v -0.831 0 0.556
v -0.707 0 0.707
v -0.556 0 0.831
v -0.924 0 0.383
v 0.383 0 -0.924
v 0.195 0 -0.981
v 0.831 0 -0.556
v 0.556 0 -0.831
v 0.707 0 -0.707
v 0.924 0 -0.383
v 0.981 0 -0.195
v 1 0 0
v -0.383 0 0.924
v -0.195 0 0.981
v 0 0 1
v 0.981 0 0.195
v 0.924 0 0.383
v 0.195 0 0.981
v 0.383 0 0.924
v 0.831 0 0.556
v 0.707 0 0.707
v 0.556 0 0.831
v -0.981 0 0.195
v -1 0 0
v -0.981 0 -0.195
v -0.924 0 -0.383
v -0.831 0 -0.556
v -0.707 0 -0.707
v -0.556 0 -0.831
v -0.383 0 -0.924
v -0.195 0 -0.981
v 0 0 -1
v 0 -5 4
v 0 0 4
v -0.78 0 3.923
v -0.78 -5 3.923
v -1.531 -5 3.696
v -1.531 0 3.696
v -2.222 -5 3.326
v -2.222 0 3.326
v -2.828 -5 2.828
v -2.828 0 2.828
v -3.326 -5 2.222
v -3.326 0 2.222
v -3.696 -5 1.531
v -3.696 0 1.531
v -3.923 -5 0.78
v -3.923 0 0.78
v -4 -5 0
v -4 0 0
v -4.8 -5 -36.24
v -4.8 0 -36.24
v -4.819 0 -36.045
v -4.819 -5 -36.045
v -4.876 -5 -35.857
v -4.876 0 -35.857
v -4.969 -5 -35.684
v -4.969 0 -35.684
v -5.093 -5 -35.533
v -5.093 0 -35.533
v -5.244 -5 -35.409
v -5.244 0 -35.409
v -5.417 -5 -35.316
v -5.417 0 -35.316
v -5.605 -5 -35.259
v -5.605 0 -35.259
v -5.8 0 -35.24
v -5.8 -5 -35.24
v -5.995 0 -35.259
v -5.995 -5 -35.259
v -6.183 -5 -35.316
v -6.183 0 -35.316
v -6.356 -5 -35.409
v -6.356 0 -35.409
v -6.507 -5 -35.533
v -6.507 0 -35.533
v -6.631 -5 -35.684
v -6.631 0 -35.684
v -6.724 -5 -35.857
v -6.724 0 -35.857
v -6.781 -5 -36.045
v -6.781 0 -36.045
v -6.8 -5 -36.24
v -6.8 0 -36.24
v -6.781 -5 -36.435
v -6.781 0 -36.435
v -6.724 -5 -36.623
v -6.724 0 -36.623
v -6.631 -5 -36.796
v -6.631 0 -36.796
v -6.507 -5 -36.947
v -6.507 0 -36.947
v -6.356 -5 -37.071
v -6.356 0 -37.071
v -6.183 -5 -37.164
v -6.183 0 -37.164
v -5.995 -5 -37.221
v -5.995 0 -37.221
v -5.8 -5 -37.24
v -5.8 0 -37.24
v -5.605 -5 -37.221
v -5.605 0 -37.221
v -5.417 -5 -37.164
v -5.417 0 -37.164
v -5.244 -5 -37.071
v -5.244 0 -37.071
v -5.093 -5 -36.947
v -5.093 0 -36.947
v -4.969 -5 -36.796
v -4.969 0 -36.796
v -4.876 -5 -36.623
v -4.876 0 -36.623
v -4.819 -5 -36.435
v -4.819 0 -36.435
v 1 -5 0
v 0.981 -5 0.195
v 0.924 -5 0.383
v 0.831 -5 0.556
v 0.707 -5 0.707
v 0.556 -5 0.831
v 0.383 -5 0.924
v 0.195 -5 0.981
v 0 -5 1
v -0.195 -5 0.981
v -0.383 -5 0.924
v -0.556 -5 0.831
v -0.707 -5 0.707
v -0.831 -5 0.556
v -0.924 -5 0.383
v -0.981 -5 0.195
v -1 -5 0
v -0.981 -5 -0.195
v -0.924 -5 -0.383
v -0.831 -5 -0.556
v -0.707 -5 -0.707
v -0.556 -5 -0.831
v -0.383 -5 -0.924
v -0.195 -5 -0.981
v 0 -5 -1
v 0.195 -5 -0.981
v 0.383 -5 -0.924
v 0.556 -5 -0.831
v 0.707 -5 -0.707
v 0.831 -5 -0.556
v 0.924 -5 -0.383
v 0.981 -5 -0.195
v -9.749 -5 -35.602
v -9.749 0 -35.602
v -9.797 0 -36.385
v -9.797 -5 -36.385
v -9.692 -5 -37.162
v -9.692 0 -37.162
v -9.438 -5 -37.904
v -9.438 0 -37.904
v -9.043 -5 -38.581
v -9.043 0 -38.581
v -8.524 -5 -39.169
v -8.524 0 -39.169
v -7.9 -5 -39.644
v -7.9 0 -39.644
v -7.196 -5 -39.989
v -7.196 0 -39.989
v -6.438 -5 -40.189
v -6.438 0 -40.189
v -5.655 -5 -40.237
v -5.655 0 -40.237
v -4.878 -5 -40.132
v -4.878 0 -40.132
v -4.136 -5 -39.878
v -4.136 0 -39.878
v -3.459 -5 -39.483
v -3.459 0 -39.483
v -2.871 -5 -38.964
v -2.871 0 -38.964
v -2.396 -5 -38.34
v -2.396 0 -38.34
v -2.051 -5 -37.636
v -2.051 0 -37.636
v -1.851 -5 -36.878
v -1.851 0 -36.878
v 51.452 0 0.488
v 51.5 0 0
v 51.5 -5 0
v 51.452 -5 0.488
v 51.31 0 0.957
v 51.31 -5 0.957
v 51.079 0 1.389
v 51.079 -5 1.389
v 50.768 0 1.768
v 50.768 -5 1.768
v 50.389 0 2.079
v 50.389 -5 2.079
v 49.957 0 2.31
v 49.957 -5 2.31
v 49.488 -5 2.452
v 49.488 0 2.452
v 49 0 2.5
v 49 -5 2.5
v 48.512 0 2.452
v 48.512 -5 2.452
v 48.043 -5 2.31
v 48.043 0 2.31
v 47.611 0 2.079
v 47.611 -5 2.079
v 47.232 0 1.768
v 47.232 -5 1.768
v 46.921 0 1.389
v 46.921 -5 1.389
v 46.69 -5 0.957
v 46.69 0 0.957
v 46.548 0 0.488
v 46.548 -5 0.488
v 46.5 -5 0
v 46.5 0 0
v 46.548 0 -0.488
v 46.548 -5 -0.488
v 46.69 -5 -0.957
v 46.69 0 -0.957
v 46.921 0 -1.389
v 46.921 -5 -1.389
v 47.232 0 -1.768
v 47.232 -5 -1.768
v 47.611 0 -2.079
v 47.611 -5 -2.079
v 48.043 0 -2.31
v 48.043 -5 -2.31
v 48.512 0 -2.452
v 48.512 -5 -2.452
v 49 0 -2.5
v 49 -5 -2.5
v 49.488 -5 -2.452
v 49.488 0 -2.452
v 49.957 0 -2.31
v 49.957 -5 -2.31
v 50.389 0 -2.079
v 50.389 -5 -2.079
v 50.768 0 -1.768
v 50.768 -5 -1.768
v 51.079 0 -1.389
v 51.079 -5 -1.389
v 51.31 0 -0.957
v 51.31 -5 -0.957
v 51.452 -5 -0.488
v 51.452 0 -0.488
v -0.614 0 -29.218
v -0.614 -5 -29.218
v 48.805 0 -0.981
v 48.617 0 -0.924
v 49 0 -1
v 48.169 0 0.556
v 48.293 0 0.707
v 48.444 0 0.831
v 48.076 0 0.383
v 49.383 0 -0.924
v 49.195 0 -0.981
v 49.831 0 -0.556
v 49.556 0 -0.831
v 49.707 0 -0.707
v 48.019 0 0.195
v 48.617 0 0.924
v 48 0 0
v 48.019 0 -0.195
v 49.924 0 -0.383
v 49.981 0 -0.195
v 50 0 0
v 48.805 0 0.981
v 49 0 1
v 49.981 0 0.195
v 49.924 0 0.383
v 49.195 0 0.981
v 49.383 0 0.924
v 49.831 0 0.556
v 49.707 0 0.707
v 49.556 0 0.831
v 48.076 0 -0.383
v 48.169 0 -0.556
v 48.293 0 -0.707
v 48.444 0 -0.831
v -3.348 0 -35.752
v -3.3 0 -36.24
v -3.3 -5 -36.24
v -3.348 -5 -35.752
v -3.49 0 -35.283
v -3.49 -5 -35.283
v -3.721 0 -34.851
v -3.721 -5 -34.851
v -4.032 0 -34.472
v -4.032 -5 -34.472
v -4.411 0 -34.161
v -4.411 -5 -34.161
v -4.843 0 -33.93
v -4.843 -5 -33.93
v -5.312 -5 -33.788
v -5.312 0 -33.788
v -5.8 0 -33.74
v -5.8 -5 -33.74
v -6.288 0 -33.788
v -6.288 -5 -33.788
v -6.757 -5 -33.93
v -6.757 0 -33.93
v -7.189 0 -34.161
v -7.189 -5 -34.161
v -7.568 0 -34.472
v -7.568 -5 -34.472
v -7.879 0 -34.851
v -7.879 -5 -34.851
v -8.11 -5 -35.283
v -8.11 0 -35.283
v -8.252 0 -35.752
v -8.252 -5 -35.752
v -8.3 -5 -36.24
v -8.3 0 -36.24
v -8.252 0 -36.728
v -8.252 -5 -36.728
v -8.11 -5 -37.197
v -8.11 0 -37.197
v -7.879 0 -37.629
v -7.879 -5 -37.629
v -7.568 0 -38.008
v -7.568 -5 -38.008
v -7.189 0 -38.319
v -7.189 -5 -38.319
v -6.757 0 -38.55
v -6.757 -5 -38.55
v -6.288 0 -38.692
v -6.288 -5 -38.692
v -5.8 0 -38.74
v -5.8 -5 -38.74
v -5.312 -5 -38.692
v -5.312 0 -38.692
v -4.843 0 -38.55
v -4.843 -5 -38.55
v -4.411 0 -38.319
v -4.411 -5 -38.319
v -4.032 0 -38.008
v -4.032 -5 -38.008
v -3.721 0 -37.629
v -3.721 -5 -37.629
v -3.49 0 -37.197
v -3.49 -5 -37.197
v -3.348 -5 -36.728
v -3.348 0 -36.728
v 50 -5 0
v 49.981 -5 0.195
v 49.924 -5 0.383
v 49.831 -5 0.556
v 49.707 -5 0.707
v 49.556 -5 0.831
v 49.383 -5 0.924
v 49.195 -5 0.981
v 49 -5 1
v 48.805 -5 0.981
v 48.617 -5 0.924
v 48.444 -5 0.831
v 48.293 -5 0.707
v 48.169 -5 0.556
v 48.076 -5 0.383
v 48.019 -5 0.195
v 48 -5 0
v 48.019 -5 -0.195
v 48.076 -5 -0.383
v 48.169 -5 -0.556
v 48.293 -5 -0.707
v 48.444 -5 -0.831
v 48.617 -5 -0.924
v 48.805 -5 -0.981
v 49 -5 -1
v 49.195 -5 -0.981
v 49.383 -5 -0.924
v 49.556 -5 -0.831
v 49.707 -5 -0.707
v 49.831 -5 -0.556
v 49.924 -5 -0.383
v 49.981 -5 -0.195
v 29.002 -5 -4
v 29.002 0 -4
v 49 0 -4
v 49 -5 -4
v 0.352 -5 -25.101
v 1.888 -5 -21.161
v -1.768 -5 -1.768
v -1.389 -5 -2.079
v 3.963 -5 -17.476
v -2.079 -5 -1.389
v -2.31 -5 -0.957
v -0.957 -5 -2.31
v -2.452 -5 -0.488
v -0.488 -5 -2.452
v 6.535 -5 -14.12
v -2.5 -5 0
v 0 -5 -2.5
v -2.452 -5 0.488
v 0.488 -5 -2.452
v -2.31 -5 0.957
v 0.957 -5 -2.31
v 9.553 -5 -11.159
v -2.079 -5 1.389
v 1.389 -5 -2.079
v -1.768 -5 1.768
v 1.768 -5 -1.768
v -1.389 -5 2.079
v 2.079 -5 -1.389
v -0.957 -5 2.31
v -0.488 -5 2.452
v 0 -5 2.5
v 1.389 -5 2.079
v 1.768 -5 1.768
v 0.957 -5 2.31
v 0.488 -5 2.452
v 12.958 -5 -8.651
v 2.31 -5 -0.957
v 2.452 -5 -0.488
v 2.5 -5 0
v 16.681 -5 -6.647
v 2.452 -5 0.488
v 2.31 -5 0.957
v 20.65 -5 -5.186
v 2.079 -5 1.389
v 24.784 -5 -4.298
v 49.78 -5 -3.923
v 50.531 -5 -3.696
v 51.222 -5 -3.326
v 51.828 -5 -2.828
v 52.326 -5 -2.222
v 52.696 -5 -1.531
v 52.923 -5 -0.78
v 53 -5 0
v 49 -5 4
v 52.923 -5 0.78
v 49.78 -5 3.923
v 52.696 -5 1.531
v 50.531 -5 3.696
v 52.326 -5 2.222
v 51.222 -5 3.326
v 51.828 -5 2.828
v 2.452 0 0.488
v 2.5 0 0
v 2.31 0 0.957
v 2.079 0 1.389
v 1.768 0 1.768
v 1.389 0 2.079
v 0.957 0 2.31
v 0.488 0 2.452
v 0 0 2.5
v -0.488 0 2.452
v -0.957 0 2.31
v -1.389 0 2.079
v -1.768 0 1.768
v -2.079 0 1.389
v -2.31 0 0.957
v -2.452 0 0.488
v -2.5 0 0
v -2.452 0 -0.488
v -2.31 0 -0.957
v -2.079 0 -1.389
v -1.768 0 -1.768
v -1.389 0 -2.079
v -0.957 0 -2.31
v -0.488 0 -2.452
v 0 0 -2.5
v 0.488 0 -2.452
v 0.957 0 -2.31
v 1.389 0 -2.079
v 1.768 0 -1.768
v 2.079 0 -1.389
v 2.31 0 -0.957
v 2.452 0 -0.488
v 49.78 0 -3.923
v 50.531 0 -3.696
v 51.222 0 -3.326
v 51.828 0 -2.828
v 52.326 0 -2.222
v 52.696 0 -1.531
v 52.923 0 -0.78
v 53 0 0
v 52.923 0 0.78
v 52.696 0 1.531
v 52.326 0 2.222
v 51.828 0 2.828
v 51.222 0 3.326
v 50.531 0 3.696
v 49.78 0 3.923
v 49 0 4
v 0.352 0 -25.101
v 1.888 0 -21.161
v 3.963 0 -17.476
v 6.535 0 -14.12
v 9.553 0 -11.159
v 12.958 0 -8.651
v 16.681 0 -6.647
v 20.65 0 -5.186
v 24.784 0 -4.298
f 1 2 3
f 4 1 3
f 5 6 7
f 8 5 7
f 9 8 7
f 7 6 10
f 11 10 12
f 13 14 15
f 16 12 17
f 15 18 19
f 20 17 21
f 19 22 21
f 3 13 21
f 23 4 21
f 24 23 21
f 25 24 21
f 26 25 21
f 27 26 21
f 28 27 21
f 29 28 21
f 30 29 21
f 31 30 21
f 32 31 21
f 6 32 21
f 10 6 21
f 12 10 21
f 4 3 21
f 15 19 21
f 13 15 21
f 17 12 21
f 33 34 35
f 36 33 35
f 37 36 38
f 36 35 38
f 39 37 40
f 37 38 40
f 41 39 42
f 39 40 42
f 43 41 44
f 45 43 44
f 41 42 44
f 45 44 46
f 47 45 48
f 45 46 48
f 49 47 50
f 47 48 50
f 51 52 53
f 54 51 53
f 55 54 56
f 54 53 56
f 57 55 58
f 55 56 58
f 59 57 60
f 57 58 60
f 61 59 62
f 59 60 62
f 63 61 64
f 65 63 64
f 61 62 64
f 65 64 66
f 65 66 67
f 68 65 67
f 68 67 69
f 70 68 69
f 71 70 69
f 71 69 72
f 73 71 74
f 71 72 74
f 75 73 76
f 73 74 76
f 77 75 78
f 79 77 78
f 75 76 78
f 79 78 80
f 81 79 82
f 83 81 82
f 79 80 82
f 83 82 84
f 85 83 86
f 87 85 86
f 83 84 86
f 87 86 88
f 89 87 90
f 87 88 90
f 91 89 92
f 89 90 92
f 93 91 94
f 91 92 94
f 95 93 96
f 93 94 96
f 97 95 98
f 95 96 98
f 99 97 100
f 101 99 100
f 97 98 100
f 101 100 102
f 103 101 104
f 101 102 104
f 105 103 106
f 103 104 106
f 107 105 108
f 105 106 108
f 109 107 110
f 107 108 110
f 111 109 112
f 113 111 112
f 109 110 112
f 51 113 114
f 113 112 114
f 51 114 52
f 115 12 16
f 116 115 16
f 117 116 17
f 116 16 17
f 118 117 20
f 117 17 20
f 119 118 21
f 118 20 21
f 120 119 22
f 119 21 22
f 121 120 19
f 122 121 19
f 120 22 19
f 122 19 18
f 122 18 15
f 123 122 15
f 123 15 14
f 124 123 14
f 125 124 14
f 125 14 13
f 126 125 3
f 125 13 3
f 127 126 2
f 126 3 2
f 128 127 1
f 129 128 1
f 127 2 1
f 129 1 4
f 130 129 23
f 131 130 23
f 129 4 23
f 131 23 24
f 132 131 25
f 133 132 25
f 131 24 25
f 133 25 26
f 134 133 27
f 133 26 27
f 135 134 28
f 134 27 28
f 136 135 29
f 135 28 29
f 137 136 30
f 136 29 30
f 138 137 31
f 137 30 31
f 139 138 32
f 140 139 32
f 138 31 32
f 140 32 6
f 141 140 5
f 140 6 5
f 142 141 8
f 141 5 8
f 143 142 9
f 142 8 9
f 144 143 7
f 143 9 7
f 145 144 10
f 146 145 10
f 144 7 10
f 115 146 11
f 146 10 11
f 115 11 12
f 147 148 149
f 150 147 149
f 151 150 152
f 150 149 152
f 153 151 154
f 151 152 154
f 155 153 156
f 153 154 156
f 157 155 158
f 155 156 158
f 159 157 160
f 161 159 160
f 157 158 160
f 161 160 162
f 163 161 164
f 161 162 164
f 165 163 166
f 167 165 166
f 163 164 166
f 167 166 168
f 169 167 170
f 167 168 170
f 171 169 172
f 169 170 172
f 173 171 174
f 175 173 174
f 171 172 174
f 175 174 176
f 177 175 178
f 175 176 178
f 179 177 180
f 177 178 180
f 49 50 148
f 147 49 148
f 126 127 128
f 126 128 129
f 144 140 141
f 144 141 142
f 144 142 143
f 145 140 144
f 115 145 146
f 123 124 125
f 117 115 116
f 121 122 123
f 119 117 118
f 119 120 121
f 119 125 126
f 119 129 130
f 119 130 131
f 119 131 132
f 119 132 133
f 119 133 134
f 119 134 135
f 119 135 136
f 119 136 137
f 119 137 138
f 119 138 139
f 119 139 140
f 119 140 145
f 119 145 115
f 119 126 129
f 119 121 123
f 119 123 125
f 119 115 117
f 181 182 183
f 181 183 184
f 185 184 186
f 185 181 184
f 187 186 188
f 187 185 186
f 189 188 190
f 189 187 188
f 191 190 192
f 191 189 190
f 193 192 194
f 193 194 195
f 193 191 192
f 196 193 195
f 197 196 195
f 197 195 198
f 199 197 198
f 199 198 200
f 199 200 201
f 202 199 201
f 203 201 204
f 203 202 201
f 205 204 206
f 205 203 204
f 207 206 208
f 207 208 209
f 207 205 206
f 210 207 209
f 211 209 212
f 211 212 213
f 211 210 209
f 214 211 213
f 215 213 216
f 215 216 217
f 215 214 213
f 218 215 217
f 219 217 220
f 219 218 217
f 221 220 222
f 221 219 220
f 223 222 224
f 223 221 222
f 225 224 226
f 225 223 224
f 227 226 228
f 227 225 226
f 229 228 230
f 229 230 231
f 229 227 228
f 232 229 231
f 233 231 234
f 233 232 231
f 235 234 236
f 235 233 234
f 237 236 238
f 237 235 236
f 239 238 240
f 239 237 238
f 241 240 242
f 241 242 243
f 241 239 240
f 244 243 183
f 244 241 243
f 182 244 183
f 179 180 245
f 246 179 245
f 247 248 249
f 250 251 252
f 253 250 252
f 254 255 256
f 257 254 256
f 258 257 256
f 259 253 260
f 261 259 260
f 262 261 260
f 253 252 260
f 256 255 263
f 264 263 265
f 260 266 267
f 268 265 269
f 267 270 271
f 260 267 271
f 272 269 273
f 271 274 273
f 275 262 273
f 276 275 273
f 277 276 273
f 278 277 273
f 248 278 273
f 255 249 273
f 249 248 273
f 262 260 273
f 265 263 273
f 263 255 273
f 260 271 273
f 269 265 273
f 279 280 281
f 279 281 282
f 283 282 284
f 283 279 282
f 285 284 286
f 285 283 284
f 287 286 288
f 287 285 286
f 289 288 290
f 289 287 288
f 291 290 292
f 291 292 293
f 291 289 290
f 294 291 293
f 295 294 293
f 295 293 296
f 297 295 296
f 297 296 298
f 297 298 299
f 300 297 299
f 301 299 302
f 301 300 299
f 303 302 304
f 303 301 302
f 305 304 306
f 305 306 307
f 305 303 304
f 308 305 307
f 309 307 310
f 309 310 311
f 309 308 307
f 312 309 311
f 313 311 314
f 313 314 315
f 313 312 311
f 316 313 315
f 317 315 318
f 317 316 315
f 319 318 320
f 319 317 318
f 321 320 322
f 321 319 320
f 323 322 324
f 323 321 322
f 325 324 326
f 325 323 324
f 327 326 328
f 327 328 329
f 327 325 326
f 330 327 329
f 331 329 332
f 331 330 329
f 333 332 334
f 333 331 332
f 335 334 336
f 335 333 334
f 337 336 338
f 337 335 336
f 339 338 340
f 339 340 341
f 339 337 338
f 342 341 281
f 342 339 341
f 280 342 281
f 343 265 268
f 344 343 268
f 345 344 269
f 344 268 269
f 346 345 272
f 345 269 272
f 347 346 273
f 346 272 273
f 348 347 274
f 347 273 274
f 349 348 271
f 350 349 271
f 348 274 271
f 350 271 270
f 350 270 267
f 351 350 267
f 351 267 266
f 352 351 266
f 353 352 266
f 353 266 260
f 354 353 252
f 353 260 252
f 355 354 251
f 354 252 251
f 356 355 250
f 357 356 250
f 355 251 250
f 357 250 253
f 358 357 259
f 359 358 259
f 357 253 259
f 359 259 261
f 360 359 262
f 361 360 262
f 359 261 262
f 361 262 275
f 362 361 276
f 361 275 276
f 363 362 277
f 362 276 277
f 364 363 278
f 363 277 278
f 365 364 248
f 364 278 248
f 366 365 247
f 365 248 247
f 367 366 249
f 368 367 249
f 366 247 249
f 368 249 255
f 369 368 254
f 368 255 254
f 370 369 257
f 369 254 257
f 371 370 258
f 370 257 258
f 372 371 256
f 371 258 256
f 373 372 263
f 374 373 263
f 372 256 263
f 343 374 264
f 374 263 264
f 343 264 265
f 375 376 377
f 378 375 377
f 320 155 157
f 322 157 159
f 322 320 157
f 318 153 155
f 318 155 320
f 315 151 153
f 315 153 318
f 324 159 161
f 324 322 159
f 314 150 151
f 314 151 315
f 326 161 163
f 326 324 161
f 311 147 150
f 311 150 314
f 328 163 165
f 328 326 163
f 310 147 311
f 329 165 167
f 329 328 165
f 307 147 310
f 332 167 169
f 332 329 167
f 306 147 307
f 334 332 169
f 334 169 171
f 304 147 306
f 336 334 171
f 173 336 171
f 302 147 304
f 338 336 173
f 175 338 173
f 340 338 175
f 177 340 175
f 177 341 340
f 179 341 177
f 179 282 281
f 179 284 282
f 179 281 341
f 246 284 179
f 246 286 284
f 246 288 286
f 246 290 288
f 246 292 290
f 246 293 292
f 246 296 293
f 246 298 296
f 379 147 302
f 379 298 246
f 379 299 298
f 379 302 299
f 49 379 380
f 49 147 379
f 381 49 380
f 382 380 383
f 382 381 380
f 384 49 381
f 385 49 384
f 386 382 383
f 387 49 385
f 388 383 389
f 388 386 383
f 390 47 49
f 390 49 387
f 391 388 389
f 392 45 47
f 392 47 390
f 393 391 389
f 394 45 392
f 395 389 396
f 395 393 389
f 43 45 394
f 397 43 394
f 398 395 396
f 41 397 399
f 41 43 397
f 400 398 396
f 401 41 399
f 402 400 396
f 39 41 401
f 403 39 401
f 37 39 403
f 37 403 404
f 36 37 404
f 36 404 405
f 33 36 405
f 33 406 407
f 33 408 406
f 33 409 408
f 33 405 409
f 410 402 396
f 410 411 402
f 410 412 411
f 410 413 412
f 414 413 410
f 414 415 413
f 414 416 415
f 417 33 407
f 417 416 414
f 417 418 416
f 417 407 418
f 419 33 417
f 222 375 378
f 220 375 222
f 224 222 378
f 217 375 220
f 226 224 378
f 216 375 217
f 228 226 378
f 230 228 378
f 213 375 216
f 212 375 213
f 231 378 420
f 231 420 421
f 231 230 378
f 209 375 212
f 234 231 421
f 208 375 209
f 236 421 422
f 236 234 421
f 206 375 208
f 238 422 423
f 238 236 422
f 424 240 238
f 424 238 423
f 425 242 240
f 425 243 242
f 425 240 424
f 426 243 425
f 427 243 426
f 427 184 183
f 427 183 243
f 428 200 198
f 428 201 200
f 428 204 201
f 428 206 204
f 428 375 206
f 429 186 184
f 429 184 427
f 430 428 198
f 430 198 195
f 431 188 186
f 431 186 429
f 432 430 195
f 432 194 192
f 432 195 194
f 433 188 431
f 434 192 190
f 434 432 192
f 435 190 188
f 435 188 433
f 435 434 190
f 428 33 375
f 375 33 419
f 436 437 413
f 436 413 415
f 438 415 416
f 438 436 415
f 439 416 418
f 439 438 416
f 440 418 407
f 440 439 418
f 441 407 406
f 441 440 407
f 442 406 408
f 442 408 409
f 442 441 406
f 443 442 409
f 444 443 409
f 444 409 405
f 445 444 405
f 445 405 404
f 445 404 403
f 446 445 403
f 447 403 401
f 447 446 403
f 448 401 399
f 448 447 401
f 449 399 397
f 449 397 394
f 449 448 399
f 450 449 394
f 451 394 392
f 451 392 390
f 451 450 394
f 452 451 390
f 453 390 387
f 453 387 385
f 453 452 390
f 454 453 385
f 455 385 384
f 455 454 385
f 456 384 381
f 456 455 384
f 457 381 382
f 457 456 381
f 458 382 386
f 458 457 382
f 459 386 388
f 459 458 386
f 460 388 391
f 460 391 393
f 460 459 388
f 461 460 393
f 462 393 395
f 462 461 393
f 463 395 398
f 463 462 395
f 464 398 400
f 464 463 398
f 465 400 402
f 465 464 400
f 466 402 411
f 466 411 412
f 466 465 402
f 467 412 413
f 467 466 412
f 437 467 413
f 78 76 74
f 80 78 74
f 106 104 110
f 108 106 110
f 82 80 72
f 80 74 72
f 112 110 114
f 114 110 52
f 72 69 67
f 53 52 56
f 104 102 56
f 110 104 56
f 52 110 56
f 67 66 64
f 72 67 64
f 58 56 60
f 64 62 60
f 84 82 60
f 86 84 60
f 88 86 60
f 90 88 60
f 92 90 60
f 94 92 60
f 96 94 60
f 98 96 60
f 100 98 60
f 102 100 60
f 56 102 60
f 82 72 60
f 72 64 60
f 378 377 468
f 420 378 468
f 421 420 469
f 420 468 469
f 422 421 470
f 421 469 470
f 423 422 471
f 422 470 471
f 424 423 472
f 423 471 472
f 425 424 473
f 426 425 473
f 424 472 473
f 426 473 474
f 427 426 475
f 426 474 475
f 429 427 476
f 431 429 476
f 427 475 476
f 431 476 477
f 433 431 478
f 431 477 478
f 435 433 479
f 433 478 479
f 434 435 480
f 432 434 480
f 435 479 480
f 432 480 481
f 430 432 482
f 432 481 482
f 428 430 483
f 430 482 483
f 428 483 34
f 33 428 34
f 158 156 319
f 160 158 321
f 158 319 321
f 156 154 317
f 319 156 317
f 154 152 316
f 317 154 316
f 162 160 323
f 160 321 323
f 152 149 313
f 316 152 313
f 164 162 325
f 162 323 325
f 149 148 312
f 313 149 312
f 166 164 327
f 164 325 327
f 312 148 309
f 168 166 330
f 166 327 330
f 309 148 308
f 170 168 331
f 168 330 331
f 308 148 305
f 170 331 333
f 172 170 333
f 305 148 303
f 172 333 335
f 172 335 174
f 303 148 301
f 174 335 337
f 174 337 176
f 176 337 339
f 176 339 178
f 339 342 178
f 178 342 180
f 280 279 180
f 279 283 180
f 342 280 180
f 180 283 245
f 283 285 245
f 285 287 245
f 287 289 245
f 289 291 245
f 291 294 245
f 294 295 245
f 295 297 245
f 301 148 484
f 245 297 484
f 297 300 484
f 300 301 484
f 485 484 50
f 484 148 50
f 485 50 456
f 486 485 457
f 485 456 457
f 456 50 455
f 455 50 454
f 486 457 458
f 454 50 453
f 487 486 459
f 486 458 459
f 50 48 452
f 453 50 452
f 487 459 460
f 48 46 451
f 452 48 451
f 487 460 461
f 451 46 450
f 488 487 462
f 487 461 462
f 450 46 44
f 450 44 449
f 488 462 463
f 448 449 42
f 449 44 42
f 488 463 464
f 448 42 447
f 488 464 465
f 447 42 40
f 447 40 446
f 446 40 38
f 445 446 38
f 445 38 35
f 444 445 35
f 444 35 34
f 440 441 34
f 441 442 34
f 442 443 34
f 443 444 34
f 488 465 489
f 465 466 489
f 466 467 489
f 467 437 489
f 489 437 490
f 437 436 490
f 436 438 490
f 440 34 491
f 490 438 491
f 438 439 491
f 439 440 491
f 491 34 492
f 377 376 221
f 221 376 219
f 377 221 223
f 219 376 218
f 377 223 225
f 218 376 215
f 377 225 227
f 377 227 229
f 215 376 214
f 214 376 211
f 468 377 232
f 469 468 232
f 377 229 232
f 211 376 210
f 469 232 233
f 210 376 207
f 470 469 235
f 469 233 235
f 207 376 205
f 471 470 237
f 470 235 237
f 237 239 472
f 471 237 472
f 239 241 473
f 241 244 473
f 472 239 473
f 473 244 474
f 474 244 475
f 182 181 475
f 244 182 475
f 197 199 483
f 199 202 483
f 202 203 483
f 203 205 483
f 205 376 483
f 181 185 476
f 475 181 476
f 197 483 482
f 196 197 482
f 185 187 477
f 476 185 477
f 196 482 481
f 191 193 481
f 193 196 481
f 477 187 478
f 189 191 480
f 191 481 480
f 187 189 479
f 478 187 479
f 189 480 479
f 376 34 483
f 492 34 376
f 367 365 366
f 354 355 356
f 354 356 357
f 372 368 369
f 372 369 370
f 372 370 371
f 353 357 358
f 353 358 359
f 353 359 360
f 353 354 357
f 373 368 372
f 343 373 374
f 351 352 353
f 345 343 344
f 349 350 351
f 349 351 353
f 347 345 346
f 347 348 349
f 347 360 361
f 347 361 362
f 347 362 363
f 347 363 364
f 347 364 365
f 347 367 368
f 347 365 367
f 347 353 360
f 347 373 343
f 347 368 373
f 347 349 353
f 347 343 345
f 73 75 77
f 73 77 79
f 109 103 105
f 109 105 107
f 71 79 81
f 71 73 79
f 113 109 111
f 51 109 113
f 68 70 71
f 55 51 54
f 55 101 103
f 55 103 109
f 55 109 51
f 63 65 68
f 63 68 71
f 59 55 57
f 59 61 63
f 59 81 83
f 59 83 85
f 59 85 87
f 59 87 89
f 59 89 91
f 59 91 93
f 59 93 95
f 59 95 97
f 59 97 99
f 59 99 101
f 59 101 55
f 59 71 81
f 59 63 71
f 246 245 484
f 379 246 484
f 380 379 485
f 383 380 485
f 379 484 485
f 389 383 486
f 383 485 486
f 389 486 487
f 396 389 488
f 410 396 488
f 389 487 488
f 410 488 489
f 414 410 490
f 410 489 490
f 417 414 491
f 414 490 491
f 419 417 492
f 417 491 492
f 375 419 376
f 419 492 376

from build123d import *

# Parameters (mm, degrees)
F0_R     = 2.5
F0_R_2   = 1
F1_DEPTH = 5


with BuildPart() as f1:
    # F0 (on Front) → F1 (new body)
    with BuildSketch(Plane.XZ):
        with BuildLine():
            Line((49, 4), (0, 4))
            ThreePointArc((0, 4), (-2.828427, 2.828427), (-4, 0))
            Line((-4, 0), (-9.74885, -35.602364))
            ThreePointArc((-9.74885, -35.602364), (-6.437636, -40.18885), (-1.85115, -36.877636))
            Line((-1.85115, -36.877636), (-0.614275, -29.21773))
            ThreePointArc((-0.614275, -29.21773), (9.553044, -11.158501), (29.002104, -4))
            Line((29.002104, -4), (49, -4))
            ThreePointArc((49, -4), (53, 0), (49, 4))
        make_face()
        with Locations((-5.8, -36.24)):
            Circle(F0_R, mode=Mode.SUBTRACT)
        Circle(F0_R, mode=Mode.SUBTRACT)
        with Locations((49, 0)):
            Circle(F0_R, mode=Mode.SUBTRACT)
        Circle(F0_R_2)
        with Locations((-5.8, -36.24)):
            Circle(F0_R_2)
        with Locations((49, 0)):
            Circle(F0_R_2)
    extrude(amount=F1_DEPTH)


solid = f1.part
